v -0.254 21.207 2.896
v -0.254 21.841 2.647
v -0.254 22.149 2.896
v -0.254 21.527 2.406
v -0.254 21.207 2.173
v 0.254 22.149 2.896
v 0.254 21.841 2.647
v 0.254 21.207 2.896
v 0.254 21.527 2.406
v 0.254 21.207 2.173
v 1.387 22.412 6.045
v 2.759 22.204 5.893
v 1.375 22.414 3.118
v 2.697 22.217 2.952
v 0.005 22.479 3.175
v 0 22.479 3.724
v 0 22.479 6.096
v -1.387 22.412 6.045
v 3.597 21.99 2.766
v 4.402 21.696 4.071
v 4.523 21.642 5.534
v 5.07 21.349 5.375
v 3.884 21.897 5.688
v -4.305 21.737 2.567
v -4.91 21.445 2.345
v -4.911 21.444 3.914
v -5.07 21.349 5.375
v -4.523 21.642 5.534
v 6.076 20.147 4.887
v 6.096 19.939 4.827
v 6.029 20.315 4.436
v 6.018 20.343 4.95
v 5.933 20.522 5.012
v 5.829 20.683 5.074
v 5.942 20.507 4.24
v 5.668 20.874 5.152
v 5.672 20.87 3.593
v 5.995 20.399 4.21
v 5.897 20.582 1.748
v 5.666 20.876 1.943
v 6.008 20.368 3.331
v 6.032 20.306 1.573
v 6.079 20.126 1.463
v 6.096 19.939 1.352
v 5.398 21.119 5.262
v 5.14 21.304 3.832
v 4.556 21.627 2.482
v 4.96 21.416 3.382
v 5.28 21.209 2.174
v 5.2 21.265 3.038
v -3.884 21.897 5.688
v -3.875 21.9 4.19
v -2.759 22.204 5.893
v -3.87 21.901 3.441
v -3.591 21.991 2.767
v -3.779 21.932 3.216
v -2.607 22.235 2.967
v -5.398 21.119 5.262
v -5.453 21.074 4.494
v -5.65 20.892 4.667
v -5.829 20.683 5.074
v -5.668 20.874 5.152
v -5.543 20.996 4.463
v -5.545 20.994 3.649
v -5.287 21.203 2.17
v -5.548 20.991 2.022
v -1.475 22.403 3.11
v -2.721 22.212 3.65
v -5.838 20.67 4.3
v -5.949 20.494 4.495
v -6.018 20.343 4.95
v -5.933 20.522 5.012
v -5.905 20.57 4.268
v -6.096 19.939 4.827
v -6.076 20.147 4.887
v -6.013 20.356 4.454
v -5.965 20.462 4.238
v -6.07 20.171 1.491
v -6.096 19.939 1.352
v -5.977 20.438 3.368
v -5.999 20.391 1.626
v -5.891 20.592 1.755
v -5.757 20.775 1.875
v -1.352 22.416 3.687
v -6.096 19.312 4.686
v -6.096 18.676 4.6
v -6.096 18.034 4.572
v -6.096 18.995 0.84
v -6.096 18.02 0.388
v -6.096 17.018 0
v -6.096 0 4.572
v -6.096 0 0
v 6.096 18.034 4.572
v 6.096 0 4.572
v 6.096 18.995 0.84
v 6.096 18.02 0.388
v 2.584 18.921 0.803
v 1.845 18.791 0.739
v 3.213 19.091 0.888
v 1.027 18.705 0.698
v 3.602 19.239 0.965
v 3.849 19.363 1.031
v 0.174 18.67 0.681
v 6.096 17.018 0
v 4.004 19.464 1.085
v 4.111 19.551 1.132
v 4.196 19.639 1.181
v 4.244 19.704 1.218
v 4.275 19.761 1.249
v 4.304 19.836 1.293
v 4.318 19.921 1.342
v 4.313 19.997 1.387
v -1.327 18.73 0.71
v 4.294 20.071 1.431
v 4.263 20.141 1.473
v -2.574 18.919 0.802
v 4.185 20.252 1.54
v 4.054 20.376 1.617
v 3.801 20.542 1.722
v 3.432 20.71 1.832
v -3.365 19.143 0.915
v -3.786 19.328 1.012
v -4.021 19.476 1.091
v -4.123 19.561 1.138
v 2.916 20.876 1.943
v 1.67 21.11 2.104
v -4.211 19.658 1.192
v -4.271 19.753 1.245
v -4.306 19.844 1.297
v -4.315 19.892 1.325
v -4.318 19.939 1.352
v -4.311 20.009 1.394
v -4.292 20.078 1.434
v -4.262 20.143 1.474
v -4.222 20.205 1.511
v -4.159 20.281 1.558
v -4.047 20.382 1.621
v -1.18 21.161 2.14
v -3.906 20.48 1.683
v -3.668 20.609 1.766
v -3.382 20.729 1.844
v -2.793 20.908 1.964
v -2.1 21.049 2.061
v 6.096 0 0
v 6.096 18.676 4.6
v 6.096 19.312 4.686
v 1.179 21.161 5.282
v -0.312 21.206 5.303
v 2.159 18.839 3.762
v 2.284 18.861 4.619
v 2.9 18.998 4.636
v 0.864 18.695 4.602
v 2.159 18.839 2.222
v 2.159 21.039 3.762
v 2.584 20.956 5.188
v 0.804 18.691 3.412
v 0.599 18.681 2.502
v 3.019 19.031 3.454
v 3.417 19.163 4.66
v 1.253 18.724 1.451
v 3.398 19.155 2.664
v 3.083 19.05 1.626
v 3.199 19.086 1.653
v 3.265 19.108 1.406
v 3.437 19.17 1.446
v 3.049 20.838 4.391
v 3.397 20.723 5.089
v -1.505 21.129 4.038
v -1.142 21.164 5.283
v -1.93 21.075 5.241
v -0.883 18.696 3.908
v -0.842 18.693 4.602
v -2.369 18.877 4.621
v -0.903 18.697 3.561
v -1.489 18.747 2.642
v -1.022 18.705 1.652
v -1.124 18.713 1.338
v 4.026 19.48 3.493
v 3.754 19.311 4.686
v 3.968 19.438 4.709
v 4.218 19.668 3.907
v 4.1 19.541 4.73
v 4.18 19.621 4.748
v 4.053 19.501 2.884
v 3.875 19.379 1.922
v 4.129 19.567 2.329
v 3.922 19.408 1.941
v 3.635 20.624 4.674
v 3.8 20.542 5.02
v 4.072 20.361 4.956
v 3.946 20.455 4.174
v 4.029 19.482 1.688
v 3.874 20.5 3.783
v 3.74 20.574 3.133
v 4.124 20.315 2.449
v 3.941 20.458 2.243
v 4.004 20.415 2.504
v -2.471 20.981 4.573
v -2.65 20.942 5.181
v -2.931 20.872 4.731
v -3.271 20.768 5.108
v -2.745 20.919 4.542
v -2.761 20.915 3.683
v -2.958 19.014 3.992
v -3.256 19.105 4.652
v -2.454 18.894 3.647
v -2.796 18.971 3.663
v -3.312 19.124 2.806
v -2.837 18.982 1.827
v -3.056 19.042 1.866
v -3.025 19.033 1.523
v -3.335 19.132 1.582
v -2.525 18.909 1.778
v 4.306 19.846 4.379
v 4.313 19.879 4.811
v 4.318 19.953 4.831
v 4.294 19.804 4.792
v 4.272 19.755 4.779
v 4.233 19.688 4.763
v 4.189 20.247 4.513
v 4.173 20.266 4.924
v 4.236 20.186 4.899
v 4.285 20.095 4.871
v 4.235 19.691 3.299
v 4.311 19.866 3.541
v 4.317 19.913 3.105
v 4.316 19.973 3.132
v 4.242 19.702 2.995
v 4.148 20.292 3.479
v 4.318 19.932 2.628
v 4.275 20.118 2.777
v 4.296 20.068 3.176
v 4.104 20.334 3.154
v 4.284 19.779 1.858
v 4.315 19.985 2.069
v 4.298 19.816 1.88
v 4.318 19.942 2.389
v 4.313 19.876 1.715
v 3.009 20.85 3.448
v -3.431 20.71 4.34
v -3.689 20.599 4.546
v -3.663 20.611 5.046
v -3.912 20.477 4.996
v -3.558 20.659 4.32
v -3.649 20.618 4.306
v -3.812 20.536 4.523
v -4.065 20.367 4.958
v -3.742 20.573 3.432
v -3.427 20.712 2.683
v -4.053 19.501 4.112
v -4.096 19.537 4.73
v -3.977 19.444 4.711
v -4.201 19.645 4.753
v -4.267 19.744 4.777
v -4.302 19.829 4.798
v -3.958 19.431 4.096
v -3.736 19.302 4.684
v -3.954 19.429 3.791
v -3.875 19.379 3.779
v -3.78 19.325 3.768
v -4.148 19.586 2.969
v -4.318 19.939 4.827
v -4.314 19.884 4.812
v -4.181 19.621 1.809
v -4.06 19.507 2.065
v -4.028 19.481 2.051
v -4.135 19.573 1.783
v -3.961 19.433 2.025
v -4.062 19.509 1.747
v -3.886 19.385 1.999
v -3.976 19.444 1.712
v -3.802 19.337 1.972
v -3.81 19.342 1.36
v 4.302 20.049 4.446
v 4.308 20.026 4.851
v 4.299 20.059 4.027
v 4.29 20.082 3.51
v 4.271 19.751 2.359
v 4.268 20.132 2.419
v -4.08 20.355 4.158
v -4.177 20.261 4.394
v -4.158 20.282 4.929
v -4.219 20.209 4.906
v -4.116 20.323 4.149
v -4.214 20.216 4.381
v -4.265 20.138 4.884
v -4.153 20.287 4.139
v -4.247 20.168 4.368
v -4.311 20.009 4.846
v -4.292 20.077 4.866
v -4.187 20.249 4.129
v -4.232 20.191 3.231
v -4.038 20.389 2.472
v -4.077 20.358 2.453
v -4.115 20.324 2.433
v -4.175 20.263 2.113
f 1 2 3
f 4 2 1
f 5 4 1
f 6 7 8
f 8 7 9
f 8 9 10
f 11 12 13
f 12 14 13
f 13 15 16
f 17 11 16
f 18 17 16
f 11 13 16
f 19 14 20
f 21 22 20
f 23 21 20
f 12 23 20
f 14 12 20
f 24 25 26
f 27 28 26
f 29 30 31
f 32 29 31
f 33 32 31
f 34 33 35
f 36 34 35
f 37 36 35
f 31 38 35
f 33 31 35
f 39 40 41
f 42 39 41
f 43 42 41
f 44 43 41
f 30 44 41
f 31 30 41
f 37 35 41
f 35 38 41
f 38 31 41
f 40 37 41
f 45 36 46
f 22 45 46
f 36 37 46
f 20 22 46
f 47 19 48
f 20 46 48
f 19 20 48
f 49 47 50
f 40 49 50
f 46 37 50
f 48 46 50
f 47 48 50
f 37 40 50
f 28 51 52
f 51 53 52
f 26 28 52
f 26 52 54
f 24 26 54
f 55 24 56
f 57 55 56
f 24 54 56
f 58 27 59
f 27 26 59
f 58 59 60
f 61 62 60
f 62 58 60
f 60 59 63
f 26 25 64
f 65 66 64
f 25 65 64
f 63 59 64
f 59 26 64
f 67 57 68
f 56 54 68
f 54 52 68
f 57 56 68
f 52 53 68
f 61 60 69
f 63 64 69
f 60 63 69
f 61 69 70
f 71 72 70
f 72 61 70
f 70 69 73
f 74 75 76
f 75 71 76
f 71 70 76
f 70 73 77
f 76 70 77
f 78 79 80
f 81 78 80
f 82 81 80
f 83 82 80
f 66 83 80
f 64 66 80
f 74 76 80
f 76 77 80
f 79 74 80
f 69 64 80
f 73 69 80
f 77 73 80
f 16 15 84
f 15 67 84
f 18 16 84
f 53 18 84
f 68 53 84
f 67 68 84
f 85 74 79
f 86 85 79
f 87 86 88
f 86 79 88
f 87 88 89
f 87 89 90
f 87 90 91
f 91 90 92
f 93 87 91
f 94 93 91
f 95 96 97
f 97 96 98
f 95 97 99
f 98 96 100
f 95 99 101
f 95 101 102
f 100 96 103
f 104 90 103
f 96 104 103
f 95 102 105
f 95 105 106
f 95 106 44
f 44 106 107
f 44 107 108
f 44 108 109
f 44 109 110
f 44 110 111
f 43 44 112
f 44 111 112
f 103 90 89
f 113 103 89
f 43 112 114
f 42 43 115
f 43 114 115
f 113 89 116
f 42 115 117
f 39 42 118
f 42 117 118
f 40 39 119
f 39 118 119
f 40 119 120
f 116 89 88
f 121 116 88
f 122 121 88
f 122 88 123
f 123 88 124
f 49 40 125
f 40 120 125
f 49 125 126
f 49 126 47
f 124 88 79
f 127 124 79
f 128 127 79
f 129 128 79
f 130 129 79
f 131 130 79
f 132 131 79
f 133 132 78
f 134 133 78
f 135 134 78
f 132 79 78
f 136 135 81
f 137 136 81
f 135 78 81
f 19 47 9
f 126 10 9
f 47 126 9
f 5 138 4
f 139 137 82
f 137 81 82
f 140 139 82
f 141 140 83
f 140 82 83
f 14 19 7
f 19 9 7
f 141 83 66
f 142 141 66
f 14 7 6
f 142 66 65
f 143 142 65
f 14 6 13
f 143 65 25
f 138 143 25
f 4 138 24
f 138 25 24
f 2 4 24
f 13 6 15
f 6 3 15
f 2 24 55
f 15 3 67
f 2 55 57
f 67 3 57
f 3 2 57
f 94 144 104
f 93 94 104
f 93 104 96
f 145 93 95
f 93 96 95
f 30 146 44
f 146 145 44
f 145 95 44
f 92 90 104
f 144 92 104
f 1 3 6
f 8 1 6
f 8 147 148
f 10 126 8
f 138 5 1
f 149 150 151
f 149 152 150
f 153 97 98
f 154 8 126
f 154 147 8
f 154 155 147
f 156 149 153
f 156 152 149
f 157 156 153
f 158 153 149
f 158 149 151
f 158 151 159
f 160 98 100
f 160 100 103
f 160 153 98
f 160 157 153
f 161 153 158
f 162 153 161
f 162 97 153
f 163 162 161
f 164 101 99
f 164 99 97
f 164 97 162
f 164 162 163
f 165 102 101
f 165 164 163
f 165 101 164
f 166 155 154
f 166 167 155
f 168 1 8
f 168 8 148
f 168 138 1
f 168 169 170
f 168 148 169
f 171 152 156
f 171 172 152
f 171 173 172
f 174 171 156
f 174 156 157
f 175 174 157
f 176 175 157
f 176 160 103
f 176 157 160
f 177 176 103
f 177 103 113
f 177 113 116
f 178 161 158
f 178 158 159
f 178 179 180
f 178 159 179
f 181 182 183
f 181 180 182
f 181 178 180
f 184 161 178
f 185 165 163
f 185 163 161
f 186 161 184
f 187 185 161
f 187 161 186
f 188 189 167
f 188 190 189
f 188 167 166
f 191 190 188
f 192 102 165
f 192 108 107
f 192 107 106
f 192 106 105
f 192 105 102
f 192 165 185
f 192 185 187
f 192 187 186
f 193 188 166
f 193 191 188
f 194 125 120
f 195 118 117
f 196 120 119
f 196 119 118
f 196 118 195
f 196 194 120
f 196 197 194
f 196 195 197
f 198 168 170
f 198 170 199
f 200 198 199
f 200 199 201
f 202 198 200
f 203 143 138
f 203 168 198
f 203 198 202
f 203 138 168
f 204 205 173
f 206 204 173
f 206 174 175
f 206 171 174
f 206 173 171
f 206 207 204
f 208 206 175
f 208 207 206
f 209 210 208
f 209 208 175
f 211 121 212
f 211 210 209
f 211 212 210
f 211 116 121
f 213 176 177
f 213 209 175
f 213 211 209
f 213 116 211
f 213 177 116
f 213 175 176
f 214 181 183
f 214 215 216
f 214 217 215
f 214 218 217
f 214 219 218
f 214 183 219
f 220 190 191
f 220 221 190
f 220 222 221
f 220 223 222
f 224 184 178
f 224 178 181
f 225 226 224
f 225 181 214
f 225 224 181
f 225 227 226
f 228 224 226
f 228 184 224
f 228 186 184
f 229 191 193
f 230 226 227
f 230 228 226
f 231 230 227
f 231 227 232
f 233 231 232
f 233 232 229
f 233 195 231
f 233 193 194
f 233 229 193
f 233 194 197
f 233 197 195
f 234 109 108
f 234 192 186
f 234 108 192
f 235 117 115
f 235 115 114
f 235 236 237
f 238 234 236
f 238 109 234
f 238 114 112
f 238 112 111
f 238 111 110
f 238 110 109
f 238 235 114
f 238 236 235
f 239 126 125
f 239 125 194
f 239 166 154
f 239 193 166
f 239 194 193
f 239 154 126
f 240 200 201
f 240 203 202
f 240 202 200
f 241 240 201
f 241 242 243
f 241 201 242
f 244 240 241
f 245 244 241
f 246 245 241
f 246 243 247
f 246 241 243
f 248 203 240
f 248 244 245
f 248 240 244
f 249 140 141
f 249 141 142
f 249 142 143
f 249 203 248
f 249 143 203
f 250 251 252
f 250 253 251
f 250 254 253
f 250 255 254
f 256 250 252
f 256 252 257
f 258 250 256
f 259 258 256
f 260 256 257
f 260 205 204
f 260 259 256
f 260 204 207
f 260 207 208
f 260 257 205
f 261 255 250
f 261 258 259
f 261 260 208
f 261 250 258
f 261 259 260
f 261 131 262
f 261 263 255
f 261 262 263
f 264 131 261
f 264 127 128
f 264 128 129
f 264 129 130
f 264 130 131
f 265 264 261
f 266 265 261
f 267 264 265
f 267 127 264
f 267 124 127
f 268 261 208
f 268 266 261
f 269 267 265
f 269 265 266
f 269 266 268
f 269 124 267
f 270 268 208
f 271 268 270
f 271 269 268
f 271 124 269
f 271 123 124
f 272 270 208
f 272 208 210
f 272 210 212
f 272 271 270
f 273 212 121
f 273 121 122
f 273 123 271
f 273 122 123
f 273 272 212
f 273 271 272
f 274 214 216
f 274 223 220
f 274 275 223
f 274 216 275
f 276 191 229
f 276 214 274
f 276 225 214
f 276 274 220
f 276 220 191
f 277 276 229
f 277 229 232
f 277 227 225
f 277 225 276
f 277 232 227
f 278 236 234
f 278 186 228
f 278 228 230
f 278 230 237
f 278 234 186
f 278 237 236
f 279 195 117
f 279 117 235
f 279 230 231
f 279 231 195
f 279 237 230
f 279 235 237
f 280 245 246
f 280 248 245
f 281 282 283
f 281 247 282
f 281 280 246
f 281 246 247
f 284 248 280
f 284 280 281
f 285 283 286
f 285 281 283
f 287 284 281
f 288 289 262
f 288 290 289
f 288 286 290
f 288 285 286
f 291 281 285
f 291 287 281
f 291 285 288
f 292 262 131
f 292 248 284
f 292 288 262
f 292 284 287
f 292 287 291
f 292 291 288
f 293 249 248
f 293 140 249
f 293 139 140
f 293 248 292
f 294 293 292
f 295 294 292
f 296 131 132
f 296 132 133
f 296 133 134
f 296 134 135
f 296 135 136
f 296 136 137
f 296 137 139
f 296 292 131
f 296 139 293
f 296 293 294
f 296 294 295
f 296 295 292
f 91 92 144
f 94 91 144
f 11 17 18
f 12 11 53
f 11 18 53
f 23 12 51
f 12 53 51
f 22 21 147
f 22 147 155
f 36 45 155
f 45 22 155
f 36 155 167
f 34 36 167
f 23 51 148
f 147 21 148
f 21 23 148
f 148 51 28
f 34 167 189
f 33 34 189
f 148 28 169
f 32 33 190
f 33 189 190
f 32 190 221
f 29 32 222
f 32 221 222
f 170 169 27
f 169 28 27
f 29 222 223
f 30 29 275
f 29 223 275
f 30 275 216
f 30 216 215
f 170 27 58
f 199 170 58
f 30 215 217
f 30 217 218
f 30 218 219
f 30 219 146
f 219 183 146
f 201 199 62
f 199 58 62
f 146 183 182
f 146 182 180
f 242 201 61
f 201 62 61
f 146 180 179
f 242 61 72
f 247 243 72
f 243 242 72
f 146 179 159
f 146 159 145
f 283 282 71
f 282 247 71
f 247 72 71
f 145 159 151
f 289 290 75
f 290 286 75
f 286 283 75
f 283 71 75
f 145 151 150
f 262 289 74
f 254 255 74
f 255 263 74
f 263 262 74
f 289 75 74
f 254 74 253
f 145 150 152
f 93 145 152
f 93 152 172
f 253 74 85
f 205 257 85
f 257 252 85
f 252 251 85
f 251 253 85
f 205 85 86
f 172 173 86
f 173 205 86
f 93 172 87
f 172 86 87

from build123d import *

# Parameters (mm, degrees)
F1_DEPTH = 6.096
F3_START = -6.0970001
F3_DEPTH = 12.1940002
F4_W     = 0.508
F4_H     = 1.905
F5_DEPTH = 2.8956


with BuildPart() as f1:
    # F0 (on Top) → F1 (new body)
    with BuildSketch(Plane.XY):
        with BuildLine():
            Line((-6.096, 19.939), (-6.096, 0))
            Line((-6.096, 0), (6.096, 0))
            Line((6.096, 0), (6.096, 19.939))
            add(Edge.make_bspline(
                [(6.096, 19.939), (6.096, 22.479), (0, 22.479), (-6.096, 22.479), (-6.096, 19.939)],
                knots=[3.1415926536, 3.1415926536, 3.1415926536, 4.7123889804, 4.7123889804, 6.2831853072, 6.2831853072, 6.2831853072], degree=2, weights=[1, 0.7071067812, 1, 0.7071067812, 1]))
        make_face()
        with BuildLine():
            add(Edge.make_bspline(
                [(-4.318, 19.939), (-4.318, 17.7392954744), (2.159, 18.8391477372), (8.636, 19.939), (2.159, 21.0388522628), (-4.318, 22.1387045256), (-4.318, 19.939)],
                knots=[0, 0, 0, 2.0943951024, 2.0943951024, 4.1887902048, 4.1887902048, 6.2831853072, 6.2831853072, 6.2831853072], degree=2, weights=[1, 0.5, 1, 0.5, 1, 0.5, 1]))
        make_face(mode=Mode.SUBTRACT)
    extrude(amount=F1_DEPTH)

    # F2 (on Right) → F3 (intersect)
    with BuildSketch(Plane.YZ.offset(F3_START)):
        with BuildLine():
            Line((0, 4.572), (0, 0))
            Line((0, 0), (17.018, 0))
            ThreePointArc((17.018, 0), (19.8988191337, 1.32895109), (22.479, 3.175))
            Line((22.479, 3.175), (22.479, 6.096))
            ThreePointArc((22.479, 6.096), (20.3835, 4.9635833333), (18.034, 4.572))
            Line((18.034, 4.572), (0, 4.572))
        make_face()
    extrude(amount=F3_DEPTH, mode=Mode.INTERSECT)

    # F4 (on face) → F5 (cut)
    with BuildSketch(Plane(origin=(0, 0, 0), x_dir=(1, 0, 0), z_dir=(0, 0, -1))):
        with Locations((0, -21.7805)):
            Rectangle(F4_W, F4_H)
    extrude(amount=-F5_DEPTH, mode=Mode.SUBTRACT)


solid = f1.part
